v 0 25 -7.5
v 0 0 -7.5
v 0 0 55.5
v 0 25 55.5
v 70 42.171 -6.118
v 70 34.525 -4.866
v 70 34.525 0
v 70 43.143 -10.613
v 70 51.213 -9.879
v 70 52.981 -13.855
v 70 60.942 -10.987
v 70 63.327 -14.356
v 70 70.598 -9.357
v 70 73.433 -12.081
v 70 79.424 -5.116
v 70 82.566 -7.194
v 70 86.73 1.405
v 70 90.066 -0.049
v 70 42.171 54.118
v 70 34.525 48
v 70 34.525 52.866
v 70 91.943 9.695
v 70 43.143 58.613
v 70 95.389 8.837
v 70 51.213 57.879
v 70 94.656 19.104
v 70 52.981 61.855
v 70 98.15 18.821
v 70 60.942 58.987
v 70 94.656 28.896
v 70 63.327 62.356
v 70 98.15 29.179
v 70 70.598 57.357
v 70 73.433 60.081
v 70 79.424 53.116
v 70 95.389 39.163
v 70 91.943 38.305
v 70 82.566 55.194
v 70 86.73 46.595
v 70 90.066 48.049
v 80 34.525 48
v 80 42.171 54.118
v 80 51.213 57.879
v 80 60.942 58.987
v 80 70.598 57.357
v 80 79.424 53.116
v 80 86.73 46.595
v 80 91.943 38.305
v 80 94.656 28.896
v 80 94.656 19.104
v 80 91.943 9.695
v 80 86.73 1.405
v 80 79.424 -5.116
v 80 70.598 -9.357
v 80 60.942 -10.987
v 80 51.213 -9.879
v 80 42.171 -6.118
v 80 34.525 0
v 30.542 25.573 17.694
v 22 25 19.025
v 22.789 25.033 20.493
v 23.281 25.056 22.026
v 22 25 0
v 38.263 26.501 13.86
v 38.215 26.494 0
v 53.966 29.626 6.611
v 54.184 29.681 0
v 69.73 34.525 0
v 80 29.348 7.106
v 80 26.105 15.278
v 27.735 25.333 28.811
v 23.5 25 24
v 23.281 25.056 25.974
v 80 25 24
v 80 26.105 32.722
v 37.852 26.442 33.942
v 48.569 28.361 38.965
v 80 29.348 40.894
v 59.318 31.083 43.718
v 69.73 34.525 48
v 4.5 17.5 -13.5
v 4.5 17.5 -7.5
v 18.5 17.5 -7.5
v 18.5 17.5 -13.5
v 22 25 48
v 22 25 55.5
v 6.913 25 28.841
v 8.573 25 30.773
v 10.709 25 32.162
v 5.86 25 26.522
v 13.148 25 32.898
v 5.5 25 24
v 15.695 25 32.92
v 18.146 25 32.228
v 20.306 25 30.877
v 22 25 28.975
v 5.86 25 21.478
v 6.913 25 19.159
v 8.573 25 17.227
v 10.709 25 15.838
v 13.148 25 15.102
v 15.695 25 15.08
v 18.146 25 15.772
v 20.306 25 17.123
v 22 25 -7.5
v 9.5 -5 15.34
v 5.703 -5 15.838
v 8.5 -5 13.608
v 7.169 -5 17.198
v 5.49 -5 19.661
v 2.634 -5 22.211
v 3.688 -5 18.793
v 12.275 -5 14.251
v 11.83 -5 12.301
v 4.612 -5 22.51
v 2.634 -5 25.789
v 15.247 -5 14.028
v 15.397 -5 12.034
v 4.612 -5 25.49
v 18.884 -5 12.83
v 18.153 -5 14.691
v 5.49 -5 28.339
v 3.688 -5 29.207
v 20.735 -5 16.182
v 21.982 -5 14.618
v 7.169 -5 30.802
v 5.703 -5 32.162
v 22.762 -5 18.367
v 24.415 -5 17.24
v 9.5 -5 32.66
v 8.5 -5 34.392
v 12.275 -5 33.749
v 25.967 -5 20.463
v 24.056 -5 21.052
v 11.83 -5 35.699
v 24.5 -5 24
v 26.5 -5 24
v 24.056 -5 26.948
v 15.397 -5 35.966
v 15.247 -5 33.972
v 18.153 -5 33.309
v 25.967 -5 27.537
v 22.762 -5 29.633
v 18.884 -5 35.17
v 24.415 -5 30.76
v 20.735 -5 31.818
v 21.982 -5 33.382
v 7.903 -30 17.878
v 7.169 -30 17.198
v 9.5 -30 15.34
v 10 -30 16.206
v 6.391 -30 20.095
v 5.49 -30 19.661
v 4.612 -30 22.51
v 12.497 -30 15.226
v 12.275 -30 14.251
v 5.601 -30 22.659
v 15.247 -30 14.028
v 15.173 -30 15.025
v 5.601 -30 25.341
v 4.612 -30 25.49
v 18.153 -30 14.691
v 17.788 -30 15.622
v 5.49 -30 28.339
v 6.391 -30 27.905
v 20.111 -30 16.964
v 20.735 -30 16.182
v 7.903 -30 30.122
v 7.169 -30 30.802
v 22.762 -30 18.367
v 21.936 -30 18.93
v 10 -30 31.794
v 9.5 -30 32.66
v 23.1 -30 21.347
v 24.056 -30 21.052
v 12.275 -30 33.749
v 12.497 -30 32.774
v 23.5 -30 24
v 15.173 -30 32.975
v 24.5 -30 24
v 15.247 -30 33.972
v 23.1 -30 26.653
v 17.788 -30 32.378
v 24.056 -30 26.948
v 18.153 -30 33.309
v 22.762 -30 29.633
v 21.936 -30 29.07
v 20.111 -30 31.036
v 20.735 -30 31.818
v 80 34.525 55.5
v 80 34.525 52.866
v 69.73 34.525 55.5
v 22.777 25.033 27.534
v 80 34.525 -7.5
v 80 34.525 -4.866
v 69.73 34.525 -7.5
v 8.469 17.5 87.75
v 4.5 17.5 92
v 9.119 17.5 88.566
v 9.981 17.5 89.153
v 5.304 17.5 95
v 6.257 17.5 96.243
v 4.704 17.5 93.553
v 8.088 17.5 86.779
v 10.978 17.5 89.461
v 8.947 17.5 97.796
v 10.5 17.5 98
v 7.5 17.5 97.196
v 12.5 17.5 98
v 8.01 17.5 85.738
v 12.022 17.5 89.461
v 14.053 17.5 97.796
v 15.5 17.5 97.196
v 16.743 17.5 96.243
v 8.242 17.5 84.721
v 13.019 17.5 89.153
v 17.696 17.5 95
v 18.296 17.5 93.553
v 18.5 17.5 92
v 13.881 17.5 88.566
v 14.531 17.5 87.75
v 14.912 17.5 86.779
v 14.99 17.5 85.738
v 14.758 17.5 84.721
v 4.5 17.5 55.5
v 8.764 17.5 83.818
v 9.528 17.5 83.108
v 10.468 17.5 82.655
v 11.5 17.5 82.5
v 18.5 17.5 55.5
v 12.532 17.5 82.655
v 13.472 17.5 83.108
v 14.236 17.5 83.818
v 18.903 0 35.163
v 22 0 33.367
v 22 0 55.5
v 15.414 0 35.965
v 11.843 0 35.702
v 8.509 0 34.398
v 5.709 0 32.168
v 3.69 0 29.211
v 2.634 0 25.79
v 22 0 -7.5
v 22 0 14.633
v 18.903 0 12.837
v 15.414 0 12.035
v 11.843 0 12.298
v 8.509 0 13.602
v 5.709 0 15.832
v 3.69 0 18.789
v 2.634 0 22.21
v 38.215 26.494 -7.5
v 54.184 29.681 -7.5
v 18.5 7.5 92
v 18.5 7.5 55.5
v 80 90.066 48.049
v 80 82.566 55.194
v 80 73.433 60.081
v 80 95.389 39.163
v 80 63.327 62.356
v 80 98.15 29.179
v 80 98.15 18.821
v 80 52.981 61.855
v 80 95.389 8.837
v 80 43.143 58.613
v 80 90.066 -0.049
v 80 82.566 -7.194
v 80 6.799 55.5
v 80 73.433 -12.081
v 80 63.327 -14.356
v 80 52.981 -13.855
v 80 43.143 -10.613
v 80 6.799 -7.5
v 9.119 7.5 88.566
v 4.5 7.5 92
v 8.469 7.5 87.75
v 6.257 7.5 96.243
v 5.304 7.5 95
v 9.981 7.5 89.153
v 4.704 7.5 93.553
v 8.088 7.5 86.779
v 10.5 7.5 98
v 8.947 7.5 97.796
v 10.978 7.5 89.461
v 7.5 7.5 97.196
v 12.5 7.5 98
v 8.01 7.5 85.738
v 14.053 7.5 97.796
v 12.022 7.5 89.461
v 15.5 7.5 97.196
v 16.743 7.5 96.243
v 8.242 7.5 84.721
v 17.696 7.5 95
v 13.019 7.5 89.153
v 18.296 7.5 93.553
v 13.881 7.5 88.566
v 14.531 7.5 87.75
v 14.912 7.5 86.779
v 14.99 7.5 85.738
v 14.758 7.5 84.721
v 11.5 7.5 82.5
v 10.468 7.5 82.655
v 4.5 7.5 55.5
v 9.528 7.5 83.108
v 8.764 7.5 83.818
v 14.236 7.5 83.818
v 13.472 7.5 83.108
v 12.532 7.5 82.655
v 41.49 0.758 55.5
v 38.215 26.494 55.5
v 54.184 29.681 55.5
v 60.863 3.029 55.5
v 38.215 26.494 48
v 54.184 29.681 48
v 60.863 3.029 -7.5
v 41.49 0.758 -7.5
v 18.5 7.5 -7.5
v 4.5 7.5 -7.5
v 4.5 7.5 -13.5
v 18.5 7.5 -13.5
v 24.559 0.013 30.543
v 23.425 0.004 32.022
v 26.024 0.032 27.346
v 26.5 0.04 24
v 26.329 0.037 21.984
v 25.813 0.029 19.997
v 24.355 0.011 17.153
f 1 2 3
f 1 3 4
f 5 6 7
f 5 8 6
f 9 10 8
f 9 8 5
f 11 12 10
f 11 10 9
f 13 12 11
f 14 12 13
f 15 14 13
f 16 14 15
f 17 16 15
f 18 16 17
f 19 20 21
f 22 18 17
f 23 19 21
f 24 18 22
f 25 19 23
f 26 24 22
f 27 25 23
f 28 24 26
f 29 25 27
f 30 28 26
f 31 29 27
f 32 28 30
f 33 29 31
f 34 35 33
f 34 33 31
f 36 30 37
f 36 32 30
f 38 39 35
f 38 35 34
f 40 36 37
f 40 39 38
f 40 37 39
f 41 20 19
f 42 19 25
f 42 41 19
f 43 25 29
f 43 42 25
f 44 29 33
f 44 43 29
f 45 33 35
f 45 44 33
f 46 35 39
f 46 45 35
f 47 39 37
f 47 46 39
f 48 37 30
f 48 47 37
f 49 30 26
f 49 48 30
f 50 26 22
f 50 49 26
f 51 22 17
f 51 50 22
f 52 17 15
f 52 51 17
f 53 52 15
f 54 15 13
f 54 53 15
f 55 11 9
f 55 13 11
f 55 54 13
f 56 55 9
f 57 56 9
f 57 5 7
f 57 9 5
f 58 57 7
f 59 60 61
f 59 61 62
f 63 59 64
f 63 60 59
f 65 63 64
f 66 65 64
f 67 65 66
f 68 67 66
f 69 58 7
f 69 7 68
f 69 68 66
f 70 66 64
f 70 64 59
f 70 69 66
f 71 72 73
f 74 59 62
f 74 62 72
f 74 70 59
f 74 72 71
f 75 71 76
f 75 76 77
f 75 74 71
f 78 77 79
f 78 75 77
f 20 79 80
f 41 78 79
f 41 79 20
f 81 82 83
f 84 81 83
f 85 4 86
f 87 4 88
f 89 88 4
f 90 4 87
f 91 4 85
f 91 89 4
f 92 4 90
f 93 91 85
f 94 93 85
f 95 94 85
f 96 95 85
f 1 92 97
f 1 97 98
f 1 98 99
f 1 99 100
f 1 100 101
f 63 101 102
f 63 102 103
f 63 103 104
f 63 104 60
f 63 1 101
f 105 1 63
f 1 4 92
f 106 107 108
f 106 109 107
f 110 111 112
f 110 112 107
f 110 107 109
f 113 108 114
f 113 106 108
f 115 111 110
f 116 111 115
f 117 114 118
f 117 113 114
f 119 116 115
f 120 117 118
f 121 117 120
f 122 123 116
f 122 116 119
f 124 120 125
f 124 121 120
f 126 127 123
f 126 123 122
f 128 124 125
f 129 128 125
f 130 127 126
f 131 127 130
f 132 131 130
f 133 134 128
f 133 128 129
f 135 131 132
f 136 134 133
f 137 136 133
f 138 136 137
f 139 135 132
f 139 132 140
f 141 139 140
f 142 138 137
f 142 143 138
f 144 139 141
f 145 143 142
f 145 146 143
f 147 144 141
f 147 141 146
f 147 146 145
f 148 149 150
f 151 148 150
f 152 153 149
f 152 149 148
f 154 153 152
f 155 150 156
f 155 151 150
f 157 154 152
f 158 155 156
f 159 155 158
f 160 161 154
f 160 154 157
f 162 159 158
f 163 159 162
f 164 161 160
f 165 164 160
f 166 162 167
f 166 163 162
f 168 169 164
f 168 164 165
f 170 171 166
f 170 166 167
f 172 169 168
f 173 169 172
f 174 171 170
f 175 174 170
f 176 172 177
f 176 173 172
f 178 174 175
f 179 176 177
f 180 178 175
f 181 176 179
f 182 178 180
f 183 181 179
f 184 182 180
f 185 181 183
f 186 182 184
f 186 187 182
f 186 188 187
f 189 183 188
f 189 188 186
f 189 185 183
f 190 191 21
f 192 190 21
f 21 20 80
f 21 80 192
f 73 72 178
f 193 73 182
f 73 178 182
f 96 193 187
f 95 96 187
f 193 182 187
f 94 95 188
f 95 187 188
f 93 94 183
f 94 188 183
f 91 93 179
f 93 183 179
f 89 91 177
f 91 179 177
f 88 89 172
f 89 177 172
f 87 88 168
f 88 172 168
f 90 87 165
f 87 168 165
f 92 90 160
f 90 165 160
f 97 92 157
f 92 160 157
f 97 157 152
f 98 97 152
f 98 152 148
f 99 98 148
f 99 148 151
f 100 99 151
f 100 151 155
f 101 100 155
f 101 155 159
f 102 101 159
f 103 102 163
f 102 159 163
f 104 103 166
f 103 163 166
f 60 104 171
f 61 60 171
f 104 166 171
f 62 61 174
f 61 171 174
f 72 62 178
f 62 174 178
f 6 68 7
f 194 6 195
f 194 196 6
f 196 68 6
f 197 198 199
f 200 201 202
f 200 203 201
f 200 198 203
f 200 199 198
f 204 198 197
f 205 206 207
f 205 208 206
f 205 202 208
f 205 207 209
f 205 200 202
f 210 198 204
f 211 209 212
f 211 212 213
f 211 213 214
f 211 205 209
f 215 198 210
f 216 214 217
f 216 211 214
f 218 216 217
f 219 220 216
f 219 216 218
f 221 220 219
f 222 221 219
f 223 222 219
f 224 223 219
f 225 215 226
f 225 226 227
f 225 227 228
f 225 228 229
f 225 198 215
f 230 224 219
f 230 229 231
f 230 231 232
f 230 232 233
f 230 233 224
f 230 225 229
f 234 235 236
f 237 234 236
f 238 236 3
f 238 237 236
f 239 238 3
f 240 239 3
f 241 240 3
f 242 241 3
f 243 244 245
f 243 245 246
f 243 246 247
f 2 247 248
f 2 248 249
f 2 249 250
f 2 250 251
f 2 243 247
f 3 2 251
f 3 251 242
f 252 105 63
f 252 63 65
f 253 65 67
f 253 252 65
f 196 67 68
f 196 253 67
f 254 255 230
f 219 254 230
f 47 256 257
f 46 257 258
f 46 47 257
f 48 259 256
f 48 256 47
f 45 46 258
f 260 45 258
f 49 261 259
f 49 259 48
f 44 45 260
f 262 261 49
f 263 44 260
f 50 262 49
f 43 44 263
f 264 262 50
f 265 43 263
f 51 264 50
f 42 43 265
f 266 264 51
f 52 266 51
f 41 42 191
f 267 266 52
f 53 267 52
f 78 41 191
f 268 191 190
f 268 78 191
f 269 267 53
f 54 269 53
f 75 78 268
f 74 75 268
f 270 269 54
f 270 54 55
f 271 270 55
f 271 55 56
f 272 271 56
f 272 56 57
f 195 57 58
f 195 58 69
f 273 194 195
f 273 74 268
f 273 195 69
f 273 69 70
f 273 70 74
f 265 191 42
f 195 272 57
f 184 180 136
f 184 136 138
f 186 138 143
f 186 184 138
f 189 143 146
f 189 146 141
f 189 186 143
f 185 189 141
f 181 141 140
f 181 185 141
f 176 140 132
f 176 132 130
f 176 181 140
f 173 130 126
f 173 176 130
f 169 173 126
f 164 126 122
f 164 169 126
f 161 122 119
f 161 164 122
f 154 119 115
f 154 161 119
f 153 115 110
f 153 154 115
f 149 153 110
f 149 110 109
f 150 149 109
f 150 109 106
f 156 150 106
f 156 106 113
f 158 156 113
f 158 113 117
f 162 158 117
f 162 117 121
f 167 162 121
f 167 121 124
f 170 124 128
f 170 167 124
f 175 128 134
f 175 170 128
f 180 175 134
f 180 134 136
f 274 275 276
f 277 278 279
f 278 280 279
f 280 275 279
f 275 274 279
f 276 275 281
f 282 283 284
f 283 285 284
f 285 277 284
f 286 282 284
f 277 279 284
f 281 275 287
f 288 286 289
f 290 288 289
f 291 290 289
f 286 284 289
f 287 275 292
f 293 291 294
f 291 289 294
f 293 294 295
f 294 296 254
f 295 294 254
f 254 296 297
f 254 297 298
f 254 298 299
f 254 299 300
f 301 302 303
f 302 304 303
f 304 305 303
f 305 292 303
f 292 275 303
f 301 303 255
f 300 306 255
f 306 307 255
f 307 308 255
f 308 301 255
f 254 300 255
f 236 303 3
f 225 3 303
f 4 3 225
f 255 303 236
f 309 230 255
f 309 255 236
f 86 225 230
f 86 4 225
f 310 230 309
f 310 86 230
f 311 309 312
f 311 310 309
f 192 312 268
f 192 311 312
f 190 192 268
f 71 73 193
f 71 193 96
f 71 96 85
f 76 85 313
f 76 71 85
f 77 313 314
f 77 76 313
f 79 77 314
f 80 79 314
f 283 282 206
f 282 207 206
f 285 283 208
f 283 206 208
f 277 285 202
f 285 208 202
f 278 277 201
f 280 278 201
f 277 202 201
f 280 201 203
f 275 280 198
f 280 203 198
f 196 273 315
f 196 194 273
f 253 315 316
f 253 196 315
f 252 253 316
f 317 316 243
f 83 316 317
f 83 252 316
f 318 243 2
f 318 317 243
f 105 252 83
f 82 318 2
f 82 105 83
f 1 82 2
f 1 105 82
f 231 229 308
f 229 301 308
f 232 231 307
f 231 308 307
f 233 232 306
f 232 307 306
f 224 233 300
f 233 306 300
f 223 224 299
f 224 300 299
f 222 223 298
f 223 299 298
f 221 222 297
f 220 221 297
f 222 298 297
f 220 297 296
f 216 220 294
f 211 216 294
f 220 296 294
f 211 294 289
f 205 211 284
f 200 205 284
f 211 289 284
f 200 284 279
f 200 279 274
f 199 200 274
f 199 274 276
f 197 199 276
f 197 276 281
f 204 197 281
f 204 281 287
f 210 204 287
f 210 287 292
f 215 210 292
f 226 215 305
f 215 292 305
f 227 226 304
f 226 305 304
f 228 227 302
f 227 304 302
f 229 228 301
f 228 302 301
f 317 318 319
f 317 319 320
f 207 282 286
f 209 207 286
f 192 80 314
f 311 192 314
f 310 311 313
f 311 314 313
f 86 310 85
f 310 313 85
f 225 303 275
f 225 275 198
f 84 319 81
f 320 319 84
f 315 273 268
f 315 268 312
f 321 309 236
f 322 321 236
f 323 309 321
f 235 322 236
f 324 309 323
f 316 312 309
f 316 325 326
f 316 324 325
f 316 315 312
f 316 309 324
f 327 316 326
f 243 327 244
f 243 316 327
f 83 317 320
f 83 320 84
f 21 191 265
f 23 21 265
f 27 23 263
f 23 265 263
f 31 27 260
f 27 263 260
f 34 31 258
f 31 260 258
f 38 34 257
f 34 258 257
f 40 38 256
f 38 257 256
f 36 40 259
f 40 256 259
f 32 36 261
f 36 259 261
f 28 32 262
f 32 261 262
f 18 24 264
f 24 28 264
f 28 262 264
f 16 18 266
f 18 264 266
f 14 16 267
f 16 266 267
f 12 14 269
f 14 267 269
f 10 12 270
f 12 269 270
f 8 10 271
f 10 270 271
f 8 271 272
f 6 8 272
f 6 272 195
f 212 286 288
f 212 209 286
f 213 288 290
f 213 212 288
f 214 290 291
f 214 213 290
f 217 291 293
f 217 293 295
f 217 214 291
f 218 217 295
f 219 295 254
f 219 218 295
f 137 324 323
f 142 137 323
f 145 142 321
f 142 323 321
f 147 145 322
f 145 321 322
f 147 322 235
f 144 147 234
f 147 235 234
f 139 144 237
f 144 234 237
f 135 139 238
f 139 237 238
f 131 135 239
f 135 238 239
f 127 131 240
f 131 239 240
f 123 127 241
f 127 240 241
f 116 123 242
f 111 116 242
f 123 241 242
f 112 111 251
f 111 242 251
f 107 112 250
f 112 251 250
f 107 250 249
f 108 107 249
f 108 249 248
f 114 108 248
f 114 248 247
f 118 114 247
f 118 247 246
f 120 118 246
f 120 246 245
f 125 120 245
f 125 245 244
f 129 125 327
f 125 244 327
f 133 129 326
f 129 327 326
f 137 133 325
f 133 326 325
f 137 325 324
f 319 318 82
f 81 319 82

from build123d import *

# Parameters (mm, degrees)
BOSS_EXTRUDE1_DEPTH       = 48
SKETCH2_W                 = 14
SKETCH2_H                 = 10
BOSS_EXTRUDE2_DEPTH       = 50
CUT_EXTRUDE1_DEPTH        = 98
M8X1_0_TAPPED_HOLE1_D     = 7
M8X1_0_TAPPED_HOLE1_DEPTH = 10
M8X1_0_TAPPED_HOLE1_TIP   = 2.103012167
FILLET1_R                 = 6
SKETCH7_R                 = 38.5
SKETCH7_R_2               = 35
BOSS_EXTRUDE3_DEPTH       = 10
SKETCH8_R                 = 35
CUT_EXTRUDE2_DEPTH        = 90
BOSS_EXTRUDE4_DEPTH       = 5
BOSS_EXTRUDE4_DEPTH_BACK  = 10
SKETCH10_R                = 12
SKETCH10_R_2              = 9
BOSS_EXTRUDE5_START       = 25
SKETCH11_R                = 10
SKETCH11_R_2              = 9
BOSS_EXTRUDE5_DEPTH       = 25
SKETCH12_R                = 9
CUT_EXTRUDE3_DEPTH        = 42
BOSS_EXTRUDE6_DEPTH       = 7.5
BOSS_EXTRUDE7_START       = 7.5
BOSS_EXTRUDE7_DEPTH       = 7.5


with BuildPart() as part:
    # Sketch1 → Boss-Extrude1 (new body)
    with BuildSketch(Plane.XY):
        with BuildLine():
            Line((0, 0), (0, 25.00039893))
            Line((0, 25.00039893), (22, 25.00039893))
            ThreePointArc((22, 25.00039893), (51.667114877, 29.062120939), (80, 38.751440389))
            Line((80, 38.751440389), (80, 6.798665084))
            ThreePointArc((80, 6.798665084), (51.198552391, 1.705464917), (22, 0))
            Line((22, 0), (0, 0))
        make_face()
    extrude(amount=BOSS_EXTRUDE1_DEPTH)

    # Sketch2 → Boss-Extrude2 (add)
    with BuildSketch(Plane.XY.offset(48)):
        with Locations((11.5, 12.5)):
            Rectangle(SKETCH2_W, SKETCH2_H)
    boss_extrude2 = extrude(amount=BOSS_EXTRUDE2_DEPTH)

    # Mirror1: Boss-Extrude2 across plane
    add(boss_extrude2.mirror(Plane.XY.offset(24)))

    # Sketch3 → Cut-Extrude1 (cut)
    with BuildSketch(Plane(origin=(0, 0, 0), x_dir=(1, 0, 0), z_dir=(0, 1, 0))):
        Polygon((32.759036304, 13.5), (11.5, 13.5), (-23.123003772, 13.5), (-23.123003772, 84.867154232), (32.759036304, 84.867154232), align=None)
    extrude(amount=CUT_EXTRUDE1_DEPTH, mode=Mode.SUBTRACT)

    # M8x1.0 Tapped Hole1
    with Locations(Plane(origin=(11.5, 17.5, 86), x_dir=(0, 0, 1), z_dir=(0, 1, 0))):
        with Locations((0, 0)):
            Hole(M8X1_0_TAPPED_HOLE1_D / 2, depth=M8X1_0_TAPPED_HOLE1_DEPTH)
            with Locations((0, 0, -(M8X1_0_TAPPED_HOLE1_DEPTH + M8X1_0_TAPPED_HOLE1_TIP / 2))):  # 118° drill point
                Cone(0, M8X1_0_TAPPED_HOLE1_D / 2, M8X1_0_TAPPED_HOLE1_TIP, mode=Mode.SUBTRACT)

    # Fillet1
    fillet1_edges = [part.edges().sort_by_distance(p)[0] for p in [
        (18.5, 12.5, 98),
        (4.5, 12.5, 98),
    ]]
    fillet(fillet1_edges, radius=FILLET1_R)

    # Sketch7 → Boss-Extrude3 (add)
    with BuildSketch(Plane.ZY.offset(-80)):
        with Locations((24, 60.00039893)):
            Circle(SKETCH7_R)
        with Locations((24, 60.00039893)):
            Circle(SKETCH7_R_2, mode=Mode.SUBTRACT)
    extrude(amount=BOSS_EXTRUDE3_DEPTH)

    # Sketch8 → Cut-Extrude2 (cut)
    with BuildSketch(Plane.ZY.offset(-80)):
        with Locations(Location((24, 60.00039893, 0), (0, 0, 226.708192407))):
            Circle(SKETCH8_R)
    extrude(amount=CUT_EXTRUDE2_DEPTH, mode=Mode.SUBTRACT)

    # Sketch10 → Boss-Extrude4 (add, two sides: drawn at the far end of the back side and taken through both)
    with BuildSketch(Plane.XZ.offset(-BOSS_EXTRUDE4_DEPTH_BACK)):
        with Locations((14.5, 24)):
            Circle(SKETCH10_R)
        with Locations((14.5, 24)):
            Circle(SKETCH10_R_2, mode=Mode.SUBTRACT)
    extrude(amount=BOSS_EXTRUDE4_DEPTH + BOSS_EXTRUDE4_DEPTH_BACK)

    # Sketch11 → Boss-Extrude5 (add)
    with BuildSketch(Plane.XZ.offset(5).offset(BOSS_EXTRUDE5_START)):
        with Locations((14.5, 24)):
            Circle(SKETCH11_R)
        with Locations((14.5, 24)):
            Circle(SKETCH11_R_2, mode=Mode.SUBTRACT)
    extrude(amount=-BOSS_EXTRUDE5_DEPTH)

    # Sketch12 → Cut-Extrude3 (cut)
    with BuildSketch(Plane(origin=(0, 0, 0), x_dir=(-1, 0, 0), z_dir=(0, -1, 0))):
        with Locations(Location((-14.5, -24, 0), (0, 0, 180))):
            Circle(SKETCH12_R)
    extrude(amount=-CUT_EXTRUDE3_DEPTH, mode=Mode.SUBTRACT)

    # Sketch13 → Boss-Extrude6 (add)
    with BuildSketch(Plane.XY.offset(48)):
        with BuildLine():
            Line((0, 25.00039893), (0, 0))
            Line((0, 0), (22, 0))
            ThreePointArc((22, 0), (51.198552391, 1.705464917), (80, 6.798665084))
            Line((80, 6.798665084), (80, 29.896412483))
            Line((80, 29.896412483), (80, 34.524920524))
            Line((80, 34.524920524), (70, 34.524920524))
            Line((70, 34.524920524), (69.729925021, 34.524920524))
            ThreePointArc((69.729925021, 34.524920524), (46.24106465, 27.877911315), (22, 25.00039893))
            Line((22, 25.00039893), (0, 25.00039893))
        make_face()
    extrude(amount=BOSS_EXTRUDE6_DEPTH)

    # Sketch14 → Boss-Extrude7 (add)
    with BuildSketch(Plane(origin=(0, 0, 0), x_dir=(-1, 0, 0), z_dir=(0, 0, -1)).offset(BOSS_EXTRUDE7_START)):
        with BuildLine():
            Line((-80, 29.896412483), (-80, 6.798665084))
            ThreePointArc((-80, 6.798665084), (-51.198552391, 1.705464917), (-22, 0))
            Line((-22, 0), (0, 0))
            Line((0, 0), (0, 25.00039893))
            Line((0, 25.00039893), (-22, 25.00039893))
            ThreePointArc((-22, 25.00039893), (-46.24106465, 27.877911315), (-69.729925021, 34.524920524))
            Line((-69.729925021, 34.524920524), (-70, 34.524920524))
            Line((-70, 34.524920524), (-80, 34.524920524))
            Line((-80, 34.524920524), (-80, 29.896412483))
        make_face()
    extrude(amount=-BOSS_EXTRUDE7_DEPTH)


solid = part.part
